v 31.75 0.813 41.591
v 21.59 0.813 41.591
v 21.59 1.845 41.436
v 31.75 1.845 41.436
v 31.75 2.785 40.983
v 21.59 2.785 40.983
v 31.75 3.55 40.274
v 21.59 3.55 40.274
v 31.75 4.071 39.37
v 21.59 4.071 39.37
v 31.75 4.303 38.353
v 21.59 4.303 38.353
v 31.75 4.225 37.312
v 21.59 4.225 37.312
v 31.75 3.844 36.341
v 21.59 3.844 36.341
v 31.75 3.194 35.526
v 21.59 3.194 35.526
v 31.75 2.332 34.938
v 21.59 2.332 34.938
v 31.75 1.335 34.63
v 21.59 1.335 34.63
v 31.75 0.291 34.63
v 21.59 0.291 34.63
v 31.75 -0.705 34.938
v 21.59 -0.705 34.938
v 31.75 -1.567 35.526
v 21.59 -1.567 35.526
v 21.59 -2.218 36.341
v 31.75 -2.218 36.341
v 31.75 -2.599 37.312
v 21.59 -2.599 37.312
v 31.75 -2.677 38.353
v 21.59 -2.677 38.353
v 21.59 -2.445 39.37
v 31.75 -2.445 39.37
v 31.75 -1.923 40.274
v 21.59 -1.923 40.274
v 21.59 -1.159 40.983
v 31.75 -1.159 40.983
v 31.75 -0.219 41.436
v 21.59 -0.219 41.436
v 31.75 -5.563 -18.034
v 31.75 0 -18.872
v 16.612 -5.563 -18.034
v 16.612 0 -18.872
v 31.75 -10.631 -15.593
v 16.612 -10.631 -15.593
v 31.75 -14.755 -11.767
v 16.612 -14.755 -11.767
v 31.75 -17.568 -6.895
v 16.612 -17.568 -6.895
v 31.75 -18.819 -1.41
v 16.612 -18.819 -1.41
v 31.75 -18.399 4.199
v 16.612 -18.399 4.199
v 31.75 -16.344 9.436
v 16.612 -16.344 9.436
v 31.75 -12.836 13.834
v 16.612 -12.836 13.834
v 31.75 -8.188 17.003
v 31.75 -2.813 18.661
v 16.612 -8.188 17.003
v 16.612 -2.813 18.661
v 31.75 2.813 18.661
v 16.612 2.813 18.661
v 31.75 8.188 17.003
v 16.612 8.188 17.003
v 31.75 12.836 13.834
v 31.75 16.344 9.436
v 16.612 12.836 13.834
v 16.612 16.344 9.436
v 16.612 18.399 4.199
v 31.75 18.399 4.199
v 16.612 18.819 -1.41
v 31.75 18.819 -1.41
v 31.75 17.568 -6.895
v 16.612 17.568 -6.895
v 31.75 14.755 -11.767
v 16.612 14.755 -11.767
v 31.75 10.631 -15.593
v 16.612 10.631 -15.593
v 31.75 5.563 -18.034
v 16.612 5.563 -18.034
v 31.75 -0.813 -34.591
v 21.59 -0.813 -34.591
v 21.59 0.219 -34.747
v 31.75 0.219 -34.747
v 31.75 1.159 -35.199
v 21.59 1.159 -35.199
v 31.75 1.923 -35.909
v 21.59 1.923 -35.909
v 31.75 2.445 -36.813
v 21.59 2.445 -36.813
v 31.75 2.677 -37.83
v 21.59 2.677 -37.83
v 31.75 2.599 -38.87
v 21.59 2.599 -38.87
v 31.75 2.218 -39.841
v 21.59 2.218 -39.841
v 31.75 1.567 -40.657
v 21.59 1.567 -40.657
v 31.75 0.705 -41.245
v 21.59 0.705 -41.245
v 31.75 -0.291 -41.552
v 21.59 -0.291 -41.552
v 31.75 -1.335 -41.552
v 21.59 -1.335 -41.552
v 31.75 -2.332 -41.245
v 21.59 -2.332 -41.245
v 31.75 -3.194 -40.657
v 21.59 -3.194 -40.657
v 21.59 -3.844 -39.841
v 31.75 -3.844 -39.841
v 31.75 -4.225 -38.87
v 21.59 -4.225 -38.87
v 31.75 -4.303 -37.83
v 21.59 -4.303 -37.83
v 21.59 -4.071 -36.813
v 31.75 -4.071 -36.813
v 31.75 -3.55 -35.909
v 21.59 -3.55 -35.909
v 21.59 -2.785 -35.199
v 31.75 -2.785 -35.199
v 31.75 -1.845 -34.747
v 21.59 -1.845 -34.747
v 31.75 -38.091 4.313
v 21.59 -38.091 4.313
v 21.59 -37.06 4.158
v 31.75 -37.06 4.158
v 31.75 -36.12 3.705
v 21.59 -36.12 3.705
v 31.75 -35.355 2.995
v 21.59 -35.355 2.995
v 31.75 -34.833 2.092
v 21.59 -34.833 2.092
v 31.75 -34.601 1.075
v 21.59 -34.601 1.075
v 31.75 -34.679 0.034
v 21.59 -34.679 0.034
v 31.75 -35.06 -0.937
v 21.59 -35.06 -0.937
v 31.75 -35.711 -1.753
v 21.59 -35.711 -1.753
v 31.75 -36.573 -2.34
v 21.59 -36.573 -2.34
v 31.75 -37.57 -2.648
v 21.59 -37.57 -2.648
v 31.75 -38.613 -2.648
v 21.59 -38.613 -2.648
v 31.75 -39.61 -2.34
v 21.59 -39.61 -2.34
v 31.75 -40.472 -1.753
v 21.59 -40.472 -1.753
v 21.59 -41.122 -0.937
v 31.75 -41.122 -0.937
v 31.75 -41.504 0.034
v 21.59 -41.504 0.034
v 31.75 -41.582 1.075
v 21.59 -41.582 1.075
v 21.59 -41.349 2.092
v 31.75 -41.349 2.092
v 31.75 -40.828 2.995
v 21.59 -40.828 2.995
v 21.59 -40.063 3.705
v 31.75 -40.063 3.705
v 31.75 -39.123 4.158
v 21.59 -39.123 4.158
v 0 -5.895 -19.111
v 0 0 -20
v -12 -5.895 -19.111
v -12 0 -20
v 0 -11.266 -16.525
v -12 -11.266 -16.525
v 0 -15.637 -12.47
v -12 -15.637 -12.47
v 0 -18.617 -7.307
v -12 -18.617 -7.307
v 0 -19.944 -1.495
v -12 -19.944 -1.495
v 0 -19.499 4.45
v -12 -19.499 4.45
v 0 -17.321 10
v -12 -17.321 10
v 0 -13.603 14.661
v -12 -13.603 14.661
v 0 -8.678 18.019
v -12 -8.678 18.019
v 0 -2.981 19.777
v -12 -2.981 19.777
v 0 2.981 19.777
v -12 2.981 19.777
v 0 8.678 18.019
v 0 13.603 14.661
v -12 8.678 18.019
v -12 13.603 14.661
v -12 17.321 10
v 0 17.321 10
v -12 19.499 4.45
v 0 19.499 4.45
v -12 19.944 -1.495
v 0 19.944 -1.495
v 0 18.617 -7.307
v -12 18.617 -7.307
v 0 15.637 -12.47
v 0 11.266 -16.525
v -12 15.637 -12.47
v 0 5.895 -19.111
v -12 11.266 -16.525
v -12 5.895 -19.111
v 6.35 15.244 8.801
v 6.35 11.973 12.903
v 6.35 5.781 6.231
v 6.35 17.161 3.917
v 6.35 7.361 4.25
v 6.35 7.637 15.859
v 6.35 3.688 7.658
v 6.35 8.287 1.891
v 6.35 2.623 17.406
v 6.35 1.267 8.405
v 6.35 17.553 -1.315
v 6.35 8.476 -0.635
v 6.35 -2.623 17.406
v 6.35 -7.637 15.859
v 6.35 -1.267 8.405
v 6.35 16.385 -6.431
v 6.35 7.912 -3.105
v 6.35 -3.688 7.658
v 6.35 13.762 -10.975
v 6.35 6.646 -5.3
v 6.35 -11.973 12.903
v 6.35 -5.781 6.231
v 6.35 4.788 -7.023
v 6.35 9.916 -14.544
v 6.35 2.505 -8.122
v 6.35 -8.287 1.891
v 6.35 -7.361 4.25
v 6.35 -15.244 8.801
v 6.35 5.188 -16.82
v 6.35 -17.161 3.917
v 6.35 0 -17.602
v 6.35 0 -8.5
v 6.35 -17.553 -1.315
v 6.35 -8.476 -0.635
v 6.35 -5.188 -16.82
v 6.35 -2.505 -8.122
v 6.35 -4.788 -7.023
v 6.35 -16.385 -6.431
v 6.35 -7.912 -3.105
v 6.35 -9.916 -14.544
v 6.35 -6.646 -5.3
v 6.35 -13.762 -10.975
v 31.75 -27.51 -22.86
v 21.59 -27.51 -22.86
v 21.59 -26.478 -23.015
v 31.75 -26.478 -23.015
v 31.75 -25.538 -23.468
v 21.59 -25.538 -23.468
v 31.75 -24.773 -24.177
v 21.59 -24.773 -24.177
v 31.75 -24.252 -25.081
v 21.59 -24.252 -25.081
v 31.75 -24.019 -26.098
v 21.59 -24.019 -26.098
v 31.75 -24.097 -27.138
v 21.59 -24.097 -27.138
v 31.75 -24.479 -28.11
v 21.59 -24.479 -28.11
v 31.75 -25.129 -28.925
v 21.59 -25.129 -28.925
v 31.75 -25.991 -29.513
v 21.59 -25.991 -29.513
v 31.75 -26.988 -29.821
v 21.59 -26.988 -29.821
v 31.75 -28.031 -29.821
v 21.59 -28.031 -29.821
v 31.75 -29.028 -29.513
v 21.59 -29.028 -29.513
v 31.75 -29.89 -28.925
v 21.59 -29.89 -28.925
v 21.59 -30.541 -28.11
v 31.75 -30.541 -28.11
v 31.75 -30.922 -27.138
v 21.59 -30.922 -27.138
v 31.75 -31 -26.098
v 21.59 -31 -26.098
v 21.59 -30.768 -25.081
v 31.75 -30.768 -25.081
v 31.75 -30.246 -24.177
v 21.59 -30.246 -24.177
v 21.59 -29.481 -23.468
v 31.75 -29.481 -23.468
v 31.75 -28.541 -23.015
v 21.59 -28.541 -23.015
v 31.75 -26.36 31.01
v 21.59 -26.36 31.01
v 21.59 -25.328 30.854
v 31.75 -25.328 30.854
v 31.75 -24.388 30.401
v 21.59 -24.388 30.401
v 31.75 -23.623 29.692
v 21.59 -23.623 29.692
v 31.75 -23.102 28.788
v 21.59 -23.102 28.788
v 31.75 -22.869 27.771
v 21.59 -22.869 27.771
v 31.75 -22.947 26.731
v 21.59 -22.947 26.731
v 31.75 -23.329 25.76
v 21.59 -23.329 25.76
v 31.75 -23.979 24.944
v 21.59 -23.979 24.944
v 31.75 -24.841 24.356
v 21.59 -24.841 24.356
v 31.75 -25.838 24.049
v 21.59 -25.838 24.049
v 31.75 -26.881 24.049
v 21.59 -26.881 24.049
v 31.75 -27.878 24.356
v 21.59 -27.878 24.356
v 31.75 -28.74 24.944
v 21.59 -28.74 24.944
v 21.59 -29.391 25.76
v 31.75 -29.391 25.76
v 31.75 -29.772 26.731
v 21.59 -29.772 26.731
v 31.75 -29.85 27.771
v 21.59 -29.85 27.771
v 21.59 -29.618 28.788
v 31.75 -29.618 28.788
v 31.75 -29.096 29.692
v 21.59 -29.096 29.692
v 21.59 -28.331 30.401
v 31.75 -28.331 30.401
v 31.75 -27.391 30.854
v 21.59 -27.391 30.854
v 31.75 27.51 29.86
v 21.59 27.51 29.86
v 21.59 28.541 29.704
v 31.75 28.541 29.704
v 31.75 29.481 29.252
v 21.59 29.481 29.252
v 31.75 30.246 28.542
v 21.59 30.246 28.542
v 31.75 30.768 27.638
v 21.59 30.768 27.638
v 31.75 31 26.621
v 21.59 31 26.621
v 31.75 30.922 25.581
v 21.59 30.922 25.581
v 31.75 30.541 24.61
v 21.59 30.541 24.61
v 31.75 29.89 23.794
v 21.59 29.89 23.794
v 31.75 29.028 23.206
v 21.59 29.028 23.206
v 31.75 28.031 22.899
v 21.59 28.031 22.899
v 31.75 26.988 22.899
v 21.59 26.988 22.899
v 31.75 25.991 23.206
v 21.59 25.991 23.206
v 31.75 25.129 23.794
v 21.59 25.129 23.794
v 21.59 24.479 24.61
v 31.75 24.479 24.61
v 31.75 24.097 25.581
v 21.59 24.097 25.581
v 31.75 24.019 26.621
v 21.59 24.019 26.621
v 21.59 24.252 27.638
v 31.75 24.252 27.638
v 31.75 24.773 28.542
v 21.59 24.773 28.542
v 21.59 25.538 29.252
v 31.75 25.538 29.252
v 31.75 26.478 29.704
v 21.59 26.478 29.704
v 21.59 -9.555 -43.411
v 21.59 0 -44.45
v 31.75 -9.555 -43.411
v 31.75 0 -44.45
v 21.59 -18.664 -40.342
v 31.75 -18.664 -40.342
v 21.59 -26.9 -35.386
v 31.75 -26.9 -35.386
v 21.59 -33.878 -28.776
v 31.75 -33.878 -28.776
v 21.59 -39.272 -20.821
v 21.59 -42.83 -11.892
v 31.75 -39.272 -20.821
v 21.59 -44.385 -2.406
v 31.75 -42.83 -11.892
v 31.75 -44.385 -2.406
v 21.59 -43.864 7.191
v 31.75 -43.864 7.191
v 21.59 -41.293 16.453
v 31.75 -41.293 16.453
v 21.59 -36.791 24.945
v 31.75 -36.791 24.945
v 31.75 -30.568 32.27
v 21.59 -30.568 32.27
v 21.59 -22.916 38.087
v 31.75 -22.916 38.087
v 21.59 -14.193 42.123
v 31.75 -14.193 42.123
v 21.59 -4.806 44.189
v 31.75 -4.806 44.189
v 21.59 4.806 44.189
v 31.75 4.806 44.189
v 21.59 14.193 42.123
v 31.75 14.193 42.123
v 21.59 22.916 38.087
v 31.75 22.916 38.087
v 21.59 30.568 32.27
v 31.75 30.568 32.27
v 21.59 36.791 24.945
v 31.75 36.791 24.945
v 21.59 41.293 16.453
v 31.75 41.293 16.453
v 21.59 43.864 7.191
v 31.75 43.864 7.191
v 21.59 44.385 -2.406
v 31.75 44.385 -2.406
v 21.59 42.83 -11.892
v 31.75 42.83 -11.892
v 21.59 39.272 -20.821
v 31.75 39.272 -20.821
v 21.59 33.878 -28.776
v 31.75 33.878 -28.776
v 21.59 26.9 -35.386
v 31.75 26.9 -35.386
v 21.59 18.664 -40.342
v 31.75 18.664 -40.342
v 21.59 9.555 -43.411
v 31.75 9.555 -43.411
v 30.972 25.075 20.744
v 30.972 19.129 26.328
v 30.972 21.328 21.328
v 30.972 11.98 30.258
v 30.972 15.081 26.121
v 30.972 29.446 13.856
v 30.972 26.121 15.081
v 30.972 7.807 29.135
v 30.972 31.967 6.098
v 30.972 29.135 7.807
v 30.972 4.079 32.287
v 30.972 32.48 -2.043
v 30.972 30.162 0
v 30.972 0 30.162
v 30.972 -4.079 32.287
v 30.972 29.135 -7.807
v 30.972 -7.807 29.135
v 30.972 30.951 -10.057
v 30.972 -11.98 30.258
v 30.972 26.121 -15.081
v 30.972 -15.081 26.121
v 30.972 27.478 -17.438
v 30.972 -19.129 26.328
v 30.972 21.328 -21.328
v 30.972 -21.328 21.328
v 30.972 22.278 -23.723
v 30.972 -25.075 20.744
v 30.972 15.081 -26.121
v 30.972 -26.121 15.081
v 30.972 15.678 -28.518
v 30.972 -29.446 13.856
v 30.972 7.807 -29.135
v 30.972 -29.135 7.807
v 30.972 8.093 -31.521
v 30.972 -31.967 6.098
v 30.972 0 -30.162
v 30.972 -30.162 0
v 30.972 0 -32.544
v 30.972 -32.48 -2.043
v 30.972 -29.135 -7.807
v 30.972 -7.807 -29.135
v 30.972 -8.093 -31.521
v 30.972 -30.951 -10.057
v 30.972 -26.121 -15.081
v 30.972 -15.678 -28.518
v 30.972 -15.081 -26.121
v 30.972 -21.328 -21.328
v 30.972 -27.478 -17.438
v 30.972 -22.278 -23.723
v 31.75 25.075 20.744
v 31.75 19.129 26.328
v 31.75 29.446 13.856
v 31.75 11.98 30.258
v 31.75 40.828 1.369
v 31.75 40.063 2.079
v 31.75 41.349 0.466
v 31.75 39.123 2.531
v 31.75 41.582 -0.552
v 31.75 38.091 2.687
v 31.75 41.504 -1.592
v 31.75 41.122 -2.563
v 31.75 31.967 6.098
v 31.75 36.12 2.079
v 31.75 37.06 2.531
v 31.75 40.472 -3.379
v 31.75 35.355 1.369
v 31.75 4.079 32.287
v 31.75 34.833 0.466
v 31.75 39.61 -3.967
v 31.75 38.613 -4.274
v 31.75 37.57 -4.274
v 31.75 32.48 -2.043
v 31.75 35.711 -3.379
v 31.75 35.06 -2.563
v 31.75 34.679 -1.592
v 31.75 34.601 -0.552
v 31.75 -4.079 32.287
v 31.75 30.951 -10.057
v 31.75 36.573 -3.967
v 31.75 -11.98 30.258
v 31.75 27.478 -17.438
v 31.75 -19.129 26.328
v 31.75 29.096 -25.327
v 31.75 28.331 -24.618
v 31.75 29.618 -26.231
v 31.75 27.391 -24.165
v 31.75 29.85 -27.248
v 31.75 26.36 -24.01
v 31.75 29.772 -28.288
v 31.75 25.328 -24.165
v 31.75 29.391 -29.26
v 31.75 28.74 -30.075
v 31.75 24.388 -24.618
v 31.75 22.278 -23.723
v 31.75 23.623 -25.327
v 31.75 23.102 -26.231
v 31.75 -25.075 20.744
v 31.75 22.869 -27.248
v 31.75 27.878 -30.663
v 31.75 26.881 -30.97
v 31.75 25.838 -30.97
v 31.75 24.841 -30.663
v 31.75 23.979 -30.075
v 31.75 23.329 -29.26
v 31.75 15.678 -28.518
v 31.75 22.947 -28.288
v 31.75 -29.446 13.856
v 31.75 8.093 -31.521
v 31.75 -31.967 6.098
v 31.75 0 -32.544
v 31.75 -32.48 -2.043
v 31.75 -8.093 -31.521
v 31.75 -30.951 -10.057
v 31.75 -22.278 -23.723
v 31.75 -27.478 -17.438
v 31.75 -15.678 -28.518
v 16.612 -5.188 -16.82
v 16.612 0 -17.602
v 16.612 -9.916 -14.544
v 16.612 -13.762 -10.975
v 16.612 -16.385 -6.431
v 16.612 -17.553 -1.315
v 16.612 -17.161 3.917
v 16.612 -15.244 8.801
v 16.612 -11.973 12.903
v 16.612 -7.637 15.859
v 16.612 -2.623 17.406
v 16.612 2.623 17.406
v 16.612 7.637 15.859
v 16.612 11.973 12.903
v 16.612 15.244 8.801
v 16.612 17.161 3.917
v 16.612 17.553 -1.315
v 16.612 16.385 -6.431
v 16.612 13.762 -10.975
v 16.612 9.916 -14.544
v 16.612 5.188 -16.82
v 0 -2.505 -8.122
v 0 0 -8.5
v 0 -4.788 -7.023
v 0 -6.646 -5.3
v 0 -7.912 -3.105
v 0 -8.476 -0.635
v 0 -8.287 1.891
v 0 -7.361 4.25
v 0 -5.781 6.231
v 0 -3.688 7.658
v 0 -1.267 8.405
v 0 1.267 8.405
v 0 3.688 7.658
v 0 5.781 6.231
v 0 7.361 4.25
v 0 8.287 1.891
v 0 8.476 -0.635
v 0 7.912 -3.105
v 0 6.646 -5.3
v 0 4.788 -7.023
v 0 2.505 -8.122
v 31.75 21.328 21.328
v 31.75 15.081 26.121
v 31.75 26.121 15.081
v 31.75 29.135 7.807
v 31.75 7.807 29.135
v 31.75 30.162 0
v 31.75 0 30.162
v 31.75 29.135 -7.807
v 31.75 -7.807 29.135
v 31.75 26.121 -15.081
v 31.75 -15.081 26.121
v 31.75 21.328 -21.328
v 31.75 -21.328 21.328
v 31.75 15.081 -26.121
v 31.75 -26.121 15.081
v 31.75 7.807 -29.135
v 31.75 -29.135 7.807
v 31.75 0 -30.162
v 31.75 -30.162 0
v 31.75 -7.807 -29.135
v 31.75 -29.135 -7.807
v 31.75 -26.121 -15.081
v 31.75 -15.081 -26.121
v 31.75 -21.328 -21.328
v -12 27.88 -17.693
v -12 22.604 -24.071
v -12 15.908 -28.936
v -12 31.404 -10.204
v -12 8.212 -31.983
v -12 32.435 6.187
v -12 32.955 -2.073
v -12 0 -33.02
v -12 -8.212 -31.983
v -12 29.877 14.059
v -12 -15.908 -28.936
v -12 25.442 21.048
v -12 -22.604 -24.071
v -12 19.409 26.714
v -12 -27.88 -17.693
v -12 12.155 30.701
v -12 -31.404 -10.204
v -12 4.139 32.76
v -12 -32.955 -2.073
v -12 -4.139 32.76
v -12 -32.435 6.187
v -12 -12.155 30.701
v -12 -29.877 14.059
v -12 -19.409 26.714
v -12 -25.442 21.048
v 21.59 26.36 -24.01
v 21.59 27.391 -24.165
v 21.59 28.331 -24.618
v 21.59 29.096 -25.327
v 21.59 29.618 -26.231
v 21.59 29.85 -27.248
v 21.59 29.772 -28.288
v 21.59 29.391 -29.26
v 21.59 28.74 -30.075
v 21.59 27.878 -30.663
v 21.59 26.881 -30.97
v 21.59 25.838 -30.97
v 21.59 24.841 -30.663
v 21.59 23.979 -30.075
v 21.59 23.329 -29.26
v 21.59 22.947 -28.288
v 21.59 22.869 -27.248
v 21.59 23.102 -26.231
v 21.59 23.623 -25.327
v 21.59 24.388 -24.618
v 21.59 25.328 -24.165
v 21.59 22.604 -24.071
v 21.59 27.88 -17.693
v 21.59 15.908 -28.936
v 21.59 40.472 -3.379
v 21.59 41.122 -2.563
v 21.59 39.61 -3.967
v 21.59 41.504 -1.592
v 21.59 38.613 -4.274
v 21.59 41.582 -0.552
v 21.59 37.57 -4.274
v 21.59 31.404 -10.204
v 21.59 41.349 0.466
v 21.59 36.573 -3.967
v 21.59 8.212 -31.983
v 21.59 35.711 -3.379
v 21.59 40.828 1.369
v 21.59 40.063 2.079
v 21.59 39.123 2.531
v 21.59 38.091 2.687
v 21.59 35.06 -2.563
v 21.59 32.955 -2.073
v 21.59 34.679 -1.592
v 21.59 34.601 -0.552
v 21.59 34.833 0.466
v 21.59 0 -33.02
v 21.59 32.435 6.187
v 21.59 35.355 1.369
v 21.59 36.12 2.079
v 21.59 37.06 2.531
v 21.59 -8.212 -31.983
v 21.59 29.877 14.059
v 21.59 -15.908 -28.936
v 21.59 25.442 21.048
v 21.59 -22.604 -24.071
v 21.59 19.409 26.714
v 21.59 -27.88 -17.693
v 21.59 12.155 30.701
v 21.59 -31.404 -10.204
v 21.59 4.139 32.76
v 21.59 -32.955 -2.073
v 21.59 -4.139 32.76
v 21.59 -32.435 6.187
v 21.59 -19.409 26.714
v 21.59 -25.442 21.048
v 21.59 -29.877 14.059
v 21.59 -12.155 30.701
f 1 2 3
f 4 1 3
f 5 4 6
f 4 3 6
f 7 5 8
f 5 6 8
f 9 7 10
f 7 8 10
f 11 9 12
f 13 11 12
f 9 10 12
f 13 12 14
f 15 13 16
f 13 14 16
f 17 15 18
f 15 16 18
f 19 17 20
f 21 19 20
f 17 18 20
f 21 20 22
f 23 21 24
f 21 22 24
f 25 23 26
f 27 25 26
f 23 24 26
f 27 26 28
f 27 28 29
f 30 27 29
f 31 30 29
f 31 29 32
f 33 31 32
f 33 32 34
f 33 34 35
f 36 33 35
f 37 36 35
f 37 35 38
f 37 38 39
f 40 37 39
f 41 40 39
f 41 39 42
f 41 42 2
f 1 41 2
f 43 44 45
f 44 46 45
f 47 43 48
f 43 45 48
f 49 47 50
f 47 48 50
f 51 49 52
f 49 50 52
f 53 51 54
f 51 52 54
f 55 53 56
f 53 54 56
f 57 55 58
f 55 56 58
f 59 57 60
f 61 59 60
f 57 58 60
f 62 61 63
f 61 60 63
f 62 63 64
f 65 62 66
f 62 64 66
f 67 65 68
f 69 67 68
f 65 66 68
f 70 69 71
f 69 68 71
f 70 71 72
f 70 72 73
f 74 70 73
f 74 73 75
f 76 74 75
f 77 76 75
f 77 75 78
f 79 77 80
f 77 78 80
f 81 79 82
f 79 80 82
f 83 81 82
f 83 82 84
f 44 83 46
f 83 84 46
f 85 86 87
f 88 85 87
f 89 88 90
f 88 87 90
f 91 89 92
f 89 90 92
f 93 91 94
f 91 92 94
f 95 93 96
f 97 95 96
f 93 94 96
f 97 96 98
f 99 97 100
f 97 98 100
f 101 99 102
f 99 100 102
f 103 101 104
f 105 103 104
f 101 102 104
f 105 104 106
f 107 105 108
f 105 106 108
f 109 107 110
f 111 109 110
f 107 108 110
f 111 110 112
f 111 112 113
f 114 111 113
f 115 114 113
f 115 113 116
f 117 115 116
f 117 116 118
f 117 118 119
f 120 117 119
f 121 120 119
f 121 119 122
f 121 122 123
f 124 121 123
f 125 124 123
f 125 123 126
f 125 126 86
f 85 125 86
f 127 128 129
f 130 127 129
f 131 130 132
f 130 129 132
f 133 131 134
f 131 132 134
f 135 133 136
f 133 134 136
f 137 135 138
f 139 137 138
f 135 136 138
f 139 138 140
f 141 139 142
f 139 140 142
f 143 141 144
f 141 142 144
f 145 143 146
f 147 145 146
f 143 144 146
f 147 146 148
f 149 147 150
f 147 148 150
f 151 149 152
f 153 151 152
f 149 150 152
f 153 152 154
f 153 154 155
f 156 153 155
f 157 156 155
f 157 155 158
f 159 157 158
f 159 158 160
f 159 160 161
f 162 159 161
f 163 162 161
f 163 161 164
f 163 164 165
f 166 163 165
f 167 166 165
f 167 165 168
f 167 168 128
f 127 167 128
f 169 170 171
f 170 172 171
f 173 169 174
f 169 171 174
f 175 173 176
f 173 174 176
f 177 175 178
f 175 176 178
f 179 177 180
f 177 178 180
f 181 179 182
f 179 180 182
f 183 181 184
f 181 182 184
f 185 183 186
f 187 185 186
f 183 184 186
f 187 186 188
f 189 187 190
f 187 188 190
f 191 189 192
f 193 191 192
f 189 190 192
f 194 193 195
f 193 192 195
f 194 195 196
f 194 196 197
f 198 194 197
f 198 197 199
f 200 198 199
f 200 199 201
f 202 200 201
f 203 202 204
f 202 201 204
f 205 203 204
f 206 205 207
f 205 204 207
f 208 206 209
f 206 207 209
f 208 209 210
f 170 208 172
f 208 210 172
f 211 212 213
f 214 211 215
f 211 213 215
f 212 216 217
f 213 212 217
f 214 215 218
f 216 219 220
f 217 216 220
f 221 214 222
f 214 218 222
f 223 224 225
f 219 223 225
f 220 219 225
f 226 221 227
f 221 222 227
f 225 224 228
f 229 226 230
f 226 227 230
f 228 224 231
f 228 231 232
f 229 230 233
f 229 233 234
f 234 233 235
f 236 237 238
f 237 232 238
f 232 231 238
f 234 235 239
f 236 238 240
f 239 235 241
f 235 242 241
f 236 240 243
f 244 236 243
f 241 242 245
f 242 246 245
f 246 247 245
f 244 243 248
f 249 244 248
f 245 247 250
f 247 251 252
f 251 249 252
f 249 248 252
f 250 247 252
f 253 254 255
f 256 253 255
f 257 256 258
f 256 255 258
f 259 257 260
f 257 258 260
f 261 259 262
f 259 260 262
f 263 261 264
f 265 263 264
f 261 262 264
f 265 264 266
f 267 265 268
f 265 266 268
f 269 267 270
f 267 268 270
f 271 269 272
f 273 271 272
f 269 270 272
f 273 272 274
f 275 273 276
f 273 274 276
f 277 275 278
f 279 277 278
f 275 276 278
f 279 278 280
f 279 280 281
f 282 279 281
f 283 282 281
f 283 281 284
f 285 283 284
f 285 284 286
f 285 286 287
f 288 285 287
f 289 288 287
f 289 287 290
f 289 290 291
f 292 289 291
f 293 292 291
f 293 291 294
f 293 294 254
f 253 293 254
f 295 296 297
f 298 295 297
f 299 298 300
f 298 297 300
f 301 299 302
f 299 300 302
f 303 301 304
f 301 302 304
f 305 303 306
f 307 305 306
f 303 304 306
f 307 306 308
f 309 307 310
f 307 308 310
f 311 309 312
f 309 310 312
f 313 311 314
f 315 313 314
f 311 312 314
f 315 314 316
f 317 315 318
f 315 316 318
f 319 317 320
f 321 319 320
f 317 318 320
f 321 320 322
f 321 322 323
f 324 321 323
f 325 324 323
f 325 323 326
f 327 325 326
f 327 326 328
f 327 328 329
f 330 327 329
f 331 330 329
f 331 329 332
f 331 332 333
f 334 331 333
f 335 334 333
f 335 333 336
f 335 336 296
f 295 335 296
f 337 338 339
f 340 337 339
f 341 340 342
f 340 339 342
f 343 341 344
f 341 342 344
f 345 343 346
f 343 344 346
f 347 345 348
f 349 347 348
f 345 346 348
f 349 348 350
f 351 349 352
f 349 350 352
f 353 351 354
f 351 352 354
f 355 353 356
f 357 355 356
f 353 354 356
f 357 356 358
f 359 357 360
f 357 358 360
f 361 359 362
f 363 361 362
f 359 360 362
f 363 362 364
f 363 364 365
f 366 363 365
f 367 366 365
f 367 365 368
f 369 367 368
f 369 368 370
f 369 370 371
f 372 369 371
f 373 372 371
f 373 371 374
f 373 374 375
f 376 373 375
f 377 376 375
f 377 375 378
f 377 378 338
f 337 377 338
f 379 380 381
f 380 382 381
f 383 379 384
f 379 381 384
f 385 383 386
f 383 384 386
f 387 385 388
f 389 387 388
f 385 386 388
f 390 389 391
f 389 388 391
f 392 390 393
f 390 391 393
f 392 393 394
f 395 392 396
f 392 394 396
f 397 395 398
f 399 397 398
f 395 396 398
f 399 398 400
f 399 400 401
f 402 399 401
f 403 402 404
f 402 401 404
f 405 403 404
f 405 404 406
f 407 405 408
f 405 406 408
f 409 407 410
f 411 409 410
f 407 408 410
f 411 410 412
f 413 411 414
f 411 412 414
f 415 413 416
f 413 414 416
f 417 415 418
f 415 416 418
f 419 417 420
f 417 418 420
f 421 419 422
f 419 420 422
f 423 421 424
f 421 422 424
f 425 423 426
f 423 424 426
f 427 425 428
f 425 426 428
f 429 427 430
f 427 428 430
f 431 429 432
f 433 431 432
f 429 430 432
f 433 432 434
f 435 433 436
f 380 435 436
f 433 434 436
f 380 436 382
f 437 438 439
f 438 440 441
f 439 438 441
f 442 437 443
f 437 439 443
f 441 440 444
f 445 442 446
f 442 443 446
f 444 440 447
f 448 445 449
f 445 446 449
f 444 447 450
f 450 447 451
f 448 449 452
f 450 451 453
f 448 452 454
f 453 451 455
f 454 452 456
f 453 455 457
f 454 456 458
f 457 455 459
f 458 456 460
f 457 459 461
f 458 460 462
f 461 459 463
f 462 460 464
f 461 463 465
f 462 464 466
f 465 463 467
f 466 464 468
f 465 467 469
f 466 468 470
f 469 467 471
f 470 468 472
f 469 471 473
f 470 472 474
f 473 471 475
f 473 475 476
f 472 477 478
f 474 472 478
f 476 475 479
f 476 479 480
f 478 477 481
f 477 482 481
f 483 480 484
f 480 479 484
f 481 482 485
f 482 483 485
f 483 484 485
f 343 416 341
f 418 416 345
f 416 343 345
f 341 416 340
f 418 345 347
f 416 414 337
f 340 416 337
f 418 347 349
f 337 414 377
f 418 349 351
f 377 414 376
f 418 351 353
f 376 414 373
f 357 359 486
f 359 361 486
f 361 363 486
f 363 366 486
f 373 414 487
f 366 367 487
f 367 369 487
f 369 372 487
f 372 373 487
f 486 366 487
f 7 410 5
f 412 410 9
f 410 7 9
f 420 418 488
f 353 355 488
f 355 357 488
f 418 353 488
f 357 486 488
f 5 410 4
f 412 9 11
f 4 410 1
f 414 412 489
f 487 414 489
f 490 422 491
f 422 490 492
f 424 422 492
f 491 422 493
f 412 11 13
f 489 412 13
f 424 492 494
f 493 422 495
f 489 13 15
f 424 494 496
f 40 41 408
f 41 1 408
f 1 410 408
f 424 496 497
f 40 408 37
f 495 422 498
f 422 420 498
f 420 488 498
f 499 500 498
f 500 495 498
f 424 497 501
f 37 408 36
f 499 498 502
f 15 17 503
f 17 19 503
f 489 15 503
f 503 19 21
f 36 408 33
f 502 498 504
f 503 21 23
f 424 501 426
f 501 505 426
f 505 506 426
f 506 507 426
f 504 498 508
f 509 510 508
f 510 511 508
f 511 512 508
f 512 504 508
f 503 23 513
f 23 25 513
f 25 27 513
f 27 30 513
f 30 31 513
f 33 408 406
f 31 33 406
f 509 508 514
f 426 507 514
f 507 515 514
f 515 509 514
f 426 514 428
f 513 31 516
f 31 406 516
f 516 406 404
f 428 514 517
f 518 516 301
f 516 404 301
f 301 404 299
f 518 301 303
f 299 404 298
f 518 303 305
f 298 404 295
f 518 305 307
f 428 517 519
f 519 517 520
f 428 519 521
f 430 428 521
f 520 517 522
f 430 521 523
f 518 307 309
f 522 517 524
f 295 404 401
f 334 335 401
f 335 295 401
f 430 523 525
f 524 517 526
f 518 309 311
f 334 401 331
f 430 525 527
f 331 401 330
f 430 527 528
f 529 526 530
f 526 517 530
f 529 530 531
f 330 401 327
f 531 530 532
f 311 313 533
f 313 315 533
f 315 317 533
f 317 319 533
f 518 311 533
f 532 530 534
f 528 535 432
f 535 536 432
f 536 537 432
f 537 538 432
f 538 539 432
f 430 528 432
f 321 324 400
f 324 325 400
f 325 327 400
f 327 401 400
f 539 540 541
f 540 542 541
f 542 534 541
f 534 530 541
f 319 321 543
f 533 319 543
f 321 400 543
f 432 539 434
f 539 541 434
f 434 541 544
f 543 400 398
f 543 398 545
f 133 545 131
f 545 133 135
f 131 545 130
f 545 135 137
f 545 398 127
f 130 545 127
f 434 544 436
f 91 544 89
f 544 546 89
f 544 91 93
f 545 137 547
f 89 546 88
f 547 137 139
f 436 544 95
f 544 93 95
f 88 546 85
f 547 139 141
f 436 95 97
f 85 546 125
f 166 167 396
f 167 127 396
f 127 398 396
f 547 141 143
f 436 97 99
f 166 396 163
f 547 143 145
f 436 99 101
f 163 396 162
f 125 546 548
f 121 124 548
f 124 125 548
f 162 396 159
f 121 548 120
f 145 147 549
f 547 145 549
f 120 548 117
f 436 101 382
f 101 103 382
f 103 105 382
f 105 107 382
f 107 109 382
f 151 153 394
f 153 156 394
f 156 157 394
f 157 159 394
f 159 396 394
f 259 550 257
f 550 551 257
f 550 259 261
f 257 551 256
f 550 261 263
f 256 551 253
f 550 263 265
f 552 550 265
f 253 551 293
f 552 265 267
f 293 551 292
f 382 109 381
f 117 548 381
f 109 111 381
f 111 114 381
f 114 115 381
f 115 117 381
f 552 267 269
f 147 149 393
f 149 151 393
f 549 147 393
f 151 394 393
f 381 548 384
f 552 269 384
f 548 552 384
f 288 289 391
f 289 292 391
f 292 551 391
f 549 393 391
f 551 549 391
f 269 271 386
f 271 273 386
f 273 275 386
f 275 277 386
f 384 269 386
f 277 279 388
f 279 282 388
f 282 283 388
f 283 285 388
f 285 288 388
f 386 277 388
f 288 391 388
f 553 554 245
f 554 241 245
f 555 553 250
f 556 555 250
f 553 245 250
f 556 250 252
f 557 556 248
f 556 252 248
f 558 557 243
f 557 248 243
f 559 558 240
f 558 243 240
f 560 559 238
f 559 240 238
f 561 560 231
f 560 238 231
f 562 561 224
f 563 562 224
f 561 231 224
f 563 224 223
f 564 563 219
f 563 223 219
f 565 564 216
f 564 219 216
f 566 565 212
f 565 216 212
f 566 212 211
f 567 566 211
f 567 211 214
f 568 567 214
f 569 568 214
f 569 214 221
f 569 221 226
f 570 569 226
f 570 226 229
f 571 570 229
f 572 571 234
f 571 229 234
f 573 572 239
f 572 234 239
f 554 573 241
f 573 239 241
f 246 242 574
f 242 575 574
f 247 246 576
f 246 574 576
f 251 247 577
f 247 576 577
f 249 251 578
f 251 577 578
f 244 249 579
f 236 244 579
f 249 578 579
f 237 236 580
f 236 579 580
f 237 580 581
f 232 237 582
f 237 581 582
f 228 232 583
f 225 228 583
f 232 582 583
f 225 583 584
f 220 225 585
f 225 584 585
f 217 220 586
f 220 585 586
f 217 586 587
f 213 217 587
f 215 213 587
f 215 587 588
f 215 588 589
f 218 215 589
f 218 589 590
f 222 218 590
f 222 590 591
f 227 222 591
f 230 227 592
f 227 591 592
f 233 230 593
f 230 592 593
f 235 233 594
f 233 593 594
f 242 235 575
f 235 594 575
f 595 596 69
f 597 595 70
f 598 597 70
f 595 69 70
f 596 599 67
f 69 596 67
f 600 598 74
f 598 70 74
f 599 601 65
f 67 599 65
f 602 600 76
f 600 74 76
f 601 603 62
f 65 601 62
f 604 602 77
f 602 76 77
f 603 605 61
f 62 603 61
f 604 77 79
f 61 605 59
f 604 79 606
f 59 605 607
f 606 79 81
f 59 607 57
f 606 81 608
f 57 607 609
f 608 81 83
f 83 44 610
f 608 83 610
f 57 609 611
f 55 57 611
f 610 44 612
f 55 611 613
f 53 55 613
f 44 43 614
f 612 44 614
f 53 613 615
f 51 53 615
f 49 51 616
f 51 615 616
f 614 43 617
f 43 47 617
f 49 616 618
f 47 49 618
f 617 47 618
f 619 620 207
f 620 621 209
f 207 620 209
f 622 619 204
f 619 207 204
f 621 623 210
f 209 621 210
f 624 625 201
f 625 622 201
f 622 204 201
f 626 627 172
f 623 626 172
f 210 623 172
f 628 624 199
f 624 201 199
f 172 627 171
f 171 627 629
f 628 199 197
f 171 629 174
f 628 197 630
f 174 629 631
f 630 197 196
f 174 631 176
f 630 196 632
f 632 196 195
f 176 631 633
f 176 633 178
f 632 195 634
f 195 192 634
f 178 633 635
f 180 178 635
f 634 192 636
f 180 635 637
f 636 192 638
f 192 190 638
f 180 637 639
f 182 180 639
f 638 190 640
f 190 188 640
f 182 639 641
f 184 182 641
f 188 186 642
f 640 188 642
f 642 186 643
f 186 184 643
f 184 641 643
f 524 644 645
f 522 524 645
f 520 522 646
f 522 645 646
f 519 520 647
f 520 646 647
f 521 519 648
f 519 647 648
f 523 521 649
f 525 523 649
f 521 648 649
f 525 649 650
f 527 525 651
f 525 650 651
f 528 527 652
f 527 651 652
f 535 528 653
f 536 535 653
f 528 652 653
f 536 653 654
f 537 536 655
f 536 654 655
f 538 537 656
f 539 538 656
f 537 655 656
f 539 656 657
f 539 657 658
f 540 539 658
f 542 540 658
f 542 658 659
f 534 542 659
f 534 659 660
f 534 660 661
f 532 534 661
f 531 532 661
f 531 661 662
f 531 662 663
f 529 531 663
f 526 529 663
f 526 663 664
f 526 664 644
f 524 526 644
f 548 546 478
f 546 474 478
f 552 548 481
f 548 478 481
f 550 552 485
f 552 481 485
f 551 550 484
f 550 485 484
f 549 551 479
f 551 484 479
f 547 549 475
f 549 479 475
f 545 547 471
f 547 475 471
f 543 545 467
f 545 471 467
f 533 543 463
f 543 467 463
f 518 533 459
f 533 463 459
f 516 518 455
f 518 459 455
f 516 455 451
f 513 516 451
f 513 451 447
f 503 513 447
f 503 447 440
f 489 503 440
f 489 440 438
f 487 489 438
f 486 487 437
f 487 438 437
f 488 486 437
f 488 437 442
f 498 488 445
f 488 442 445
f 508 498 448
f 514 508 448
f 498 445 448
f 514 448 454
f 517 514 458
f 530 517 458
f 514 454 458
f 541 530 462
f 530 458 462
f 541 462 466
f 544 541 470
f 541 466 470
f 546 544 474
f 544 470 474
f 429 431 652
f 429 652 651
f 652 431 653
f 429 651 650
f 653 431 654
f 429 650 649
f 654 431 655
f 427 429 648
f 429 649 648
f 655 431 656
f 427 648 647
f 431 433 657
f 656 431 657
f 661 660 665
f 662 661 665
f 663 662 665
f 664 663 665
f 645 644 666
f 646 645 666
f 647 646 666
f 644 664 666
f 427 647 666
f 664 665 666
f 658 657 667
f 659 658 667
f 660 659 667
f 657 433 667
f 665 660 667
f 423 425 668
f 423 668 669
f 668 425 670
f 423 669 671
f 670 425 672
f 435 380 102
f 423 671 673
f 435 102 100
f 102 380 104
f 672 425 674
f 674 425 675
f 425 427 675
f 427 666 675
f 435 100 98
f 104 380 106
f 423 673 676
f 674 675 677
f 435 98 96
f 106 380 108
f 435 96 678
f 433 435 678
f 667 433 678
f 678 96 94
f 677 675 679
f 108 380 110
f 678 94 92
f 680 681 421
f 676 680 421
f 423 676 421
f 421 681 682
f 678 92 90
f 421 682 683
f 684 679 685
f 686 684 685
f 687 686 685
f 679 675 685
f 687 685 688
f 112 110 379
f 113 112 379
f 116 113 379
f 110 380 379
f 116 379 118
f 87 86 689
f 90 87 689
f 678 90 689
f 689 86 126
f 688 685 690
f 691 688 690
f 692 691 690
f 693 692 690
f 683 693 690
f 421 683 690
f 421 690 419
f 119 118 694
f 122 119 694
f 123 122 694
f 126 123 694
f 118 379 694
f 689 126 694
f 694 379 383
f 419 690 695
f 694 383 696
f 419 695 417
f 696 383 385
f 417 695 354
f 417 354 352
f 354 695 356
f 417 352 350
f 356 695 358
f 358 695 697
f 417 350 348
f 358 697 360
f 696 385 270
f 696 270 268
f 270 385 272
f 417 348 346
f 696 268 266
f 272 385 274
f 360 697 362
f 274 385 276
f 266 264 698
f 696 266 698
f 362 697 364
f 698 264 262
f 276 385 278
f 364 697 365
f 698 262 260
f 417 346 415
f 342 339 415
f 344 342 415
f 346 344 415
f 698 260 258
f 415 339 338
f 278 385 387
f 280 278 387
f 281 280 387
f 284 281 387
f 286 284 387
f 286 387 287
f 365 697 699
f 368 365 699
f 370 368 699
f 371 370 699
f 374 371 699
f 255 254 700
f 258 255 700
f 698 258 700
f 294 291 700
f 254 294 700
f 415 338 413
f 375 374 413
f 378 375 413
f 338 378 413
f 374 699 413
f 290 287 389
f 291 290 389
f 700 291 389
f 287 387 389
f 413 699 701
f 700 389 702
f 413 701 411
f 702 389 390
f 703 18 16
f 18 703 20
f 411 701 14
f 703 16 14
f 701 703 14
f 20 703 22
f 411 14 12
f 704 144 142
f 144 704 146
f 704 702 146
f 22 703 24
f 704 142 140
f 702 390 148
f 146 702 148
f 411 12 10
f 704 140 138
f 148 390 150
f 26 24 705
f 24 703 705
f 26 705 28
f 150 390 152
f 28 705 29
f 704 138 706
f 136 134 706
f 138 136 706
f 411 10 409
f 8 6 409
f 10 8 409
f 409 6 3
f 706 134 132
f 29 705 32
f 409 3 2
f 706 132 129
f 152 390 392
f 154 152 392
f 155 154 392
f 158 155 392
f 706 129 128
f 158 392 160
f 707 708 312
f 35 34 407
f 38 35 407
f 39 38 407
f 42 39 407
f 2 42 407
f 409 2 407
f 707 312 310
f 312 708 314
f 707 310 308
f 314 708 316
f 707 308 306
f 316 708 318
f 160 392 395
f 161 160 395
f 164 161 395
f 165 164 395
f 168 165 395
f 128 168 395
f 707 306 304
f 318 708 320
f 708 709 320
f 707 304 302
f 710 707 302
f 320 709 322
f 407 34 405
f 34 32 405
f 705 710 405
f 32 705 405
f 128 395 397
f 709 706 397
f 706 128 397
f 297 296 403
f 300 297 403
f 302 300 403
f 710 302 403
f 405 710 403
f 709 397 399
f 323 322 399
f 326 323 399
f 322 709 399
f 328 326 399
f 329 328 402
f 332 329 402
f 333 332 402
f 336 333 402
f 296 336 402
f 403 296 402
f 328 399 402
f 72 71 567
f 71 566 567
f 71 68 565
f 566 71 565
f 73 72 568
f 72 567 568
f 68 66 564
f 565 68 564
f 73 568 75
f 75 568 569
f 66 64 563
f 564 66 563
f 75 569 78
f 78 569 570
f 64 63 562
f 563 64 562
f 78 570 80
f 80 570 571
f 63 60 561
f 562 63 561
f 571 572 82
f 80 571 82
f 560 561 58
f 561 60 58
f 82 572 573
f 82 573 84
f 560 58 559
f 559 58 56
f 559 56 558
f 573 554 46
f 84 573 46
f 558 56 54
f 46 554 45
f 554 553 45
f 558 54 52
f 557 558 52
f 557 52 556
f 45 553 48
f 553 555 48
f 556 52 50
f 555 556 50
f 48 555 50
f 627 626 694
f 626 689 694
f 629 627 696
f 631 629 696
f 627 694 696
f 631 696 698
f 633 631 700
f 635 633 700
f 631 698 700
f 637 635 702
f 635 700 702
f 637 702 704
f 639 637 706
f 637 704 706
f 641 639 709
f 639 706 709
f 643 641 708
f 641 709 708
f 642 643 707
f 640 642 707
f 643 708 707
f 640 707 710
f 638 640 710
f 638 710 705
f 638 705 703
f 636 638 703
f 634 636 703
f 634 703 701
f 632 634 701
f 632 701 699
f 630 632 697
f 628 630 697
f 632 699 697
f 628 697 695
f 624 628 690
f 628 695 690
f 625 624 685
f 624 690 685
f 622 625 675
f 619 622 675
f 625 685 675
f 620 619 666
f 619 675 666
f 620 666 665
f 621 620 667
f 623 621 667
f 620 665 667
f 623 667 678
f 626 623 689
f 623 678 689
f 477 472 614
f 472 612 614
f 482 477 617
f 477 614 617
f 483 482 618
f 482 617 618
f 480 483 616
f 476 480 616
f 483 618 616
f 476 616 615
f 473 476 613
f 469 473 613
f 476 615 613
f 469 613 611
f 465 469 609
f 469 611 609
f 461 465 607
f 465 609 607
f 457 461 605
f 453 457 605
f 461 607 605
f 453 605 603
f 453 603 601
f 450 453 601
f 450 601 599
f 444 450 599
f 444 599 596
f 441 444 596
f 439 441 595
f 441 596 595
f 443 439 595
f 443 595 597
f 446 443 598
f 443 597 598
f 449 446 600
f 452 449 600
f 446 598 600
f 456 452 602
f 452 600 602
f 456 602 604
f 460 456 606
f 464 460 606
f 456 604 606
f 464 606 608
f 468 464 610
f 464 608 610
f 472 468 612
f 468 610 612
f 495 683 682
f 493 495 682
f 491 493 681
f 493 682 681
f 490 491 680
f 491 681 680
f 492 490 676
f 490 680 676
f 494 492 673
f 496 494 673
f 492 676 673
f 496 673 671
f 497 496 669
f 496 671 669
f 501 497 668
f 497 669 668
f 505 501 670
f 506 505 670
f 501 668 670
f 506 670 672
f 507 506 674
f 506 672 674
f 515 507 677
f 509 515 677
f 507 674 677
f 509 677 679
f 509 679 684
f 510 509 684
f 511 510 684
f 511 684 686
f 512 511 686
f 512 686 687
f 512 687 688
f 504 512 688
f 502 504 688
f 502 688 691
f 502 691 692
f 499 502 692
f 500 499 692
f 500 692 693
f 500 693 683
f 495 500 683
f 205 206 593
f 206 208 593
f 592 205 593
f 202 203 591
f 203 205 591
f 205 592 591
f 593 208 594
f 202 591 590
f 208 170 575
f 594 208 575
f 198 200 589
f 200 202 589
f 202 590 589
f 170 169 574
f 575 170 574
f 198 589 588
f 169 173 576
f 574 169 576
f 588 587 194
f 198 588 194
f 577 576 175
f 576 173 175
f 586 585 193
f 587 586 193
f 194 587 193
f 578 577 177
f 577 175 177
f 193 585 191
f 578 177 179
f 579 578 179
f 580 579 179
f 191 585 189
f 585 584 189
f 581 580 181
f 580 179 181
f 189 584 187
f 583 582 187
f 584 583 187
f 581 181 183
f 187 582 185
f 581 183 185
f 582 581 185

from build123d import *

# Parameters (mm, degrees)
M6_CLEARANCE_HOLE1_D = 7


with BuildPart() as part:
    # Main sketch → Revolve1 (revolve)
    with BuildSketch(Plane.XY, mode=Mode.PRIVATE) as revolve1_sk:
        Polygon((0, 8.500000018), (0, 20.000000005), (-11.999999876, 20.000000005), (-11.999999876, 33.02), (21.59, 33.02), (21.59, 44.45), (31.75, 44.45), (31.75, 32.54375), (30.972125, 32.54375), (30.972125, 30.1625), (31.75, 30.1625), (31.75, 18.8722), (16.6116, 18.8722), (16.6116, 17.6022), (6.35, 17.6022), (6.35, 8.500000018), align=None)
    revolve(revolve1_sk.sketch.rotate(Axis((71.950113838, 0, 0), (-1, 0, 0)), 90), axis=Axis((71.950113838, 0, 0), (-1, 0, 0)))

    # M6 Clearance Hole1 (through all)
    with Locations(Plane(origin=(31.75, 0, 0), x_dir=(0, 0, -1), z_dir=(1, 0, 0))):
        with Locations((0, 0), (-38.091322418, 0.813115257), (-27.509591698, -26.359673074), (-0.813115257, -38.091322418), (26.359673074, -27.509591698), (38.091322418, -0.813115257), (27.509591698, 26.359673074), (0.813115257, 38.091322418), (-26.359673074, 27.509591698)):
            Hole(M6_CLEARANCE_HOLE1_D / 2)


solid = part.part
